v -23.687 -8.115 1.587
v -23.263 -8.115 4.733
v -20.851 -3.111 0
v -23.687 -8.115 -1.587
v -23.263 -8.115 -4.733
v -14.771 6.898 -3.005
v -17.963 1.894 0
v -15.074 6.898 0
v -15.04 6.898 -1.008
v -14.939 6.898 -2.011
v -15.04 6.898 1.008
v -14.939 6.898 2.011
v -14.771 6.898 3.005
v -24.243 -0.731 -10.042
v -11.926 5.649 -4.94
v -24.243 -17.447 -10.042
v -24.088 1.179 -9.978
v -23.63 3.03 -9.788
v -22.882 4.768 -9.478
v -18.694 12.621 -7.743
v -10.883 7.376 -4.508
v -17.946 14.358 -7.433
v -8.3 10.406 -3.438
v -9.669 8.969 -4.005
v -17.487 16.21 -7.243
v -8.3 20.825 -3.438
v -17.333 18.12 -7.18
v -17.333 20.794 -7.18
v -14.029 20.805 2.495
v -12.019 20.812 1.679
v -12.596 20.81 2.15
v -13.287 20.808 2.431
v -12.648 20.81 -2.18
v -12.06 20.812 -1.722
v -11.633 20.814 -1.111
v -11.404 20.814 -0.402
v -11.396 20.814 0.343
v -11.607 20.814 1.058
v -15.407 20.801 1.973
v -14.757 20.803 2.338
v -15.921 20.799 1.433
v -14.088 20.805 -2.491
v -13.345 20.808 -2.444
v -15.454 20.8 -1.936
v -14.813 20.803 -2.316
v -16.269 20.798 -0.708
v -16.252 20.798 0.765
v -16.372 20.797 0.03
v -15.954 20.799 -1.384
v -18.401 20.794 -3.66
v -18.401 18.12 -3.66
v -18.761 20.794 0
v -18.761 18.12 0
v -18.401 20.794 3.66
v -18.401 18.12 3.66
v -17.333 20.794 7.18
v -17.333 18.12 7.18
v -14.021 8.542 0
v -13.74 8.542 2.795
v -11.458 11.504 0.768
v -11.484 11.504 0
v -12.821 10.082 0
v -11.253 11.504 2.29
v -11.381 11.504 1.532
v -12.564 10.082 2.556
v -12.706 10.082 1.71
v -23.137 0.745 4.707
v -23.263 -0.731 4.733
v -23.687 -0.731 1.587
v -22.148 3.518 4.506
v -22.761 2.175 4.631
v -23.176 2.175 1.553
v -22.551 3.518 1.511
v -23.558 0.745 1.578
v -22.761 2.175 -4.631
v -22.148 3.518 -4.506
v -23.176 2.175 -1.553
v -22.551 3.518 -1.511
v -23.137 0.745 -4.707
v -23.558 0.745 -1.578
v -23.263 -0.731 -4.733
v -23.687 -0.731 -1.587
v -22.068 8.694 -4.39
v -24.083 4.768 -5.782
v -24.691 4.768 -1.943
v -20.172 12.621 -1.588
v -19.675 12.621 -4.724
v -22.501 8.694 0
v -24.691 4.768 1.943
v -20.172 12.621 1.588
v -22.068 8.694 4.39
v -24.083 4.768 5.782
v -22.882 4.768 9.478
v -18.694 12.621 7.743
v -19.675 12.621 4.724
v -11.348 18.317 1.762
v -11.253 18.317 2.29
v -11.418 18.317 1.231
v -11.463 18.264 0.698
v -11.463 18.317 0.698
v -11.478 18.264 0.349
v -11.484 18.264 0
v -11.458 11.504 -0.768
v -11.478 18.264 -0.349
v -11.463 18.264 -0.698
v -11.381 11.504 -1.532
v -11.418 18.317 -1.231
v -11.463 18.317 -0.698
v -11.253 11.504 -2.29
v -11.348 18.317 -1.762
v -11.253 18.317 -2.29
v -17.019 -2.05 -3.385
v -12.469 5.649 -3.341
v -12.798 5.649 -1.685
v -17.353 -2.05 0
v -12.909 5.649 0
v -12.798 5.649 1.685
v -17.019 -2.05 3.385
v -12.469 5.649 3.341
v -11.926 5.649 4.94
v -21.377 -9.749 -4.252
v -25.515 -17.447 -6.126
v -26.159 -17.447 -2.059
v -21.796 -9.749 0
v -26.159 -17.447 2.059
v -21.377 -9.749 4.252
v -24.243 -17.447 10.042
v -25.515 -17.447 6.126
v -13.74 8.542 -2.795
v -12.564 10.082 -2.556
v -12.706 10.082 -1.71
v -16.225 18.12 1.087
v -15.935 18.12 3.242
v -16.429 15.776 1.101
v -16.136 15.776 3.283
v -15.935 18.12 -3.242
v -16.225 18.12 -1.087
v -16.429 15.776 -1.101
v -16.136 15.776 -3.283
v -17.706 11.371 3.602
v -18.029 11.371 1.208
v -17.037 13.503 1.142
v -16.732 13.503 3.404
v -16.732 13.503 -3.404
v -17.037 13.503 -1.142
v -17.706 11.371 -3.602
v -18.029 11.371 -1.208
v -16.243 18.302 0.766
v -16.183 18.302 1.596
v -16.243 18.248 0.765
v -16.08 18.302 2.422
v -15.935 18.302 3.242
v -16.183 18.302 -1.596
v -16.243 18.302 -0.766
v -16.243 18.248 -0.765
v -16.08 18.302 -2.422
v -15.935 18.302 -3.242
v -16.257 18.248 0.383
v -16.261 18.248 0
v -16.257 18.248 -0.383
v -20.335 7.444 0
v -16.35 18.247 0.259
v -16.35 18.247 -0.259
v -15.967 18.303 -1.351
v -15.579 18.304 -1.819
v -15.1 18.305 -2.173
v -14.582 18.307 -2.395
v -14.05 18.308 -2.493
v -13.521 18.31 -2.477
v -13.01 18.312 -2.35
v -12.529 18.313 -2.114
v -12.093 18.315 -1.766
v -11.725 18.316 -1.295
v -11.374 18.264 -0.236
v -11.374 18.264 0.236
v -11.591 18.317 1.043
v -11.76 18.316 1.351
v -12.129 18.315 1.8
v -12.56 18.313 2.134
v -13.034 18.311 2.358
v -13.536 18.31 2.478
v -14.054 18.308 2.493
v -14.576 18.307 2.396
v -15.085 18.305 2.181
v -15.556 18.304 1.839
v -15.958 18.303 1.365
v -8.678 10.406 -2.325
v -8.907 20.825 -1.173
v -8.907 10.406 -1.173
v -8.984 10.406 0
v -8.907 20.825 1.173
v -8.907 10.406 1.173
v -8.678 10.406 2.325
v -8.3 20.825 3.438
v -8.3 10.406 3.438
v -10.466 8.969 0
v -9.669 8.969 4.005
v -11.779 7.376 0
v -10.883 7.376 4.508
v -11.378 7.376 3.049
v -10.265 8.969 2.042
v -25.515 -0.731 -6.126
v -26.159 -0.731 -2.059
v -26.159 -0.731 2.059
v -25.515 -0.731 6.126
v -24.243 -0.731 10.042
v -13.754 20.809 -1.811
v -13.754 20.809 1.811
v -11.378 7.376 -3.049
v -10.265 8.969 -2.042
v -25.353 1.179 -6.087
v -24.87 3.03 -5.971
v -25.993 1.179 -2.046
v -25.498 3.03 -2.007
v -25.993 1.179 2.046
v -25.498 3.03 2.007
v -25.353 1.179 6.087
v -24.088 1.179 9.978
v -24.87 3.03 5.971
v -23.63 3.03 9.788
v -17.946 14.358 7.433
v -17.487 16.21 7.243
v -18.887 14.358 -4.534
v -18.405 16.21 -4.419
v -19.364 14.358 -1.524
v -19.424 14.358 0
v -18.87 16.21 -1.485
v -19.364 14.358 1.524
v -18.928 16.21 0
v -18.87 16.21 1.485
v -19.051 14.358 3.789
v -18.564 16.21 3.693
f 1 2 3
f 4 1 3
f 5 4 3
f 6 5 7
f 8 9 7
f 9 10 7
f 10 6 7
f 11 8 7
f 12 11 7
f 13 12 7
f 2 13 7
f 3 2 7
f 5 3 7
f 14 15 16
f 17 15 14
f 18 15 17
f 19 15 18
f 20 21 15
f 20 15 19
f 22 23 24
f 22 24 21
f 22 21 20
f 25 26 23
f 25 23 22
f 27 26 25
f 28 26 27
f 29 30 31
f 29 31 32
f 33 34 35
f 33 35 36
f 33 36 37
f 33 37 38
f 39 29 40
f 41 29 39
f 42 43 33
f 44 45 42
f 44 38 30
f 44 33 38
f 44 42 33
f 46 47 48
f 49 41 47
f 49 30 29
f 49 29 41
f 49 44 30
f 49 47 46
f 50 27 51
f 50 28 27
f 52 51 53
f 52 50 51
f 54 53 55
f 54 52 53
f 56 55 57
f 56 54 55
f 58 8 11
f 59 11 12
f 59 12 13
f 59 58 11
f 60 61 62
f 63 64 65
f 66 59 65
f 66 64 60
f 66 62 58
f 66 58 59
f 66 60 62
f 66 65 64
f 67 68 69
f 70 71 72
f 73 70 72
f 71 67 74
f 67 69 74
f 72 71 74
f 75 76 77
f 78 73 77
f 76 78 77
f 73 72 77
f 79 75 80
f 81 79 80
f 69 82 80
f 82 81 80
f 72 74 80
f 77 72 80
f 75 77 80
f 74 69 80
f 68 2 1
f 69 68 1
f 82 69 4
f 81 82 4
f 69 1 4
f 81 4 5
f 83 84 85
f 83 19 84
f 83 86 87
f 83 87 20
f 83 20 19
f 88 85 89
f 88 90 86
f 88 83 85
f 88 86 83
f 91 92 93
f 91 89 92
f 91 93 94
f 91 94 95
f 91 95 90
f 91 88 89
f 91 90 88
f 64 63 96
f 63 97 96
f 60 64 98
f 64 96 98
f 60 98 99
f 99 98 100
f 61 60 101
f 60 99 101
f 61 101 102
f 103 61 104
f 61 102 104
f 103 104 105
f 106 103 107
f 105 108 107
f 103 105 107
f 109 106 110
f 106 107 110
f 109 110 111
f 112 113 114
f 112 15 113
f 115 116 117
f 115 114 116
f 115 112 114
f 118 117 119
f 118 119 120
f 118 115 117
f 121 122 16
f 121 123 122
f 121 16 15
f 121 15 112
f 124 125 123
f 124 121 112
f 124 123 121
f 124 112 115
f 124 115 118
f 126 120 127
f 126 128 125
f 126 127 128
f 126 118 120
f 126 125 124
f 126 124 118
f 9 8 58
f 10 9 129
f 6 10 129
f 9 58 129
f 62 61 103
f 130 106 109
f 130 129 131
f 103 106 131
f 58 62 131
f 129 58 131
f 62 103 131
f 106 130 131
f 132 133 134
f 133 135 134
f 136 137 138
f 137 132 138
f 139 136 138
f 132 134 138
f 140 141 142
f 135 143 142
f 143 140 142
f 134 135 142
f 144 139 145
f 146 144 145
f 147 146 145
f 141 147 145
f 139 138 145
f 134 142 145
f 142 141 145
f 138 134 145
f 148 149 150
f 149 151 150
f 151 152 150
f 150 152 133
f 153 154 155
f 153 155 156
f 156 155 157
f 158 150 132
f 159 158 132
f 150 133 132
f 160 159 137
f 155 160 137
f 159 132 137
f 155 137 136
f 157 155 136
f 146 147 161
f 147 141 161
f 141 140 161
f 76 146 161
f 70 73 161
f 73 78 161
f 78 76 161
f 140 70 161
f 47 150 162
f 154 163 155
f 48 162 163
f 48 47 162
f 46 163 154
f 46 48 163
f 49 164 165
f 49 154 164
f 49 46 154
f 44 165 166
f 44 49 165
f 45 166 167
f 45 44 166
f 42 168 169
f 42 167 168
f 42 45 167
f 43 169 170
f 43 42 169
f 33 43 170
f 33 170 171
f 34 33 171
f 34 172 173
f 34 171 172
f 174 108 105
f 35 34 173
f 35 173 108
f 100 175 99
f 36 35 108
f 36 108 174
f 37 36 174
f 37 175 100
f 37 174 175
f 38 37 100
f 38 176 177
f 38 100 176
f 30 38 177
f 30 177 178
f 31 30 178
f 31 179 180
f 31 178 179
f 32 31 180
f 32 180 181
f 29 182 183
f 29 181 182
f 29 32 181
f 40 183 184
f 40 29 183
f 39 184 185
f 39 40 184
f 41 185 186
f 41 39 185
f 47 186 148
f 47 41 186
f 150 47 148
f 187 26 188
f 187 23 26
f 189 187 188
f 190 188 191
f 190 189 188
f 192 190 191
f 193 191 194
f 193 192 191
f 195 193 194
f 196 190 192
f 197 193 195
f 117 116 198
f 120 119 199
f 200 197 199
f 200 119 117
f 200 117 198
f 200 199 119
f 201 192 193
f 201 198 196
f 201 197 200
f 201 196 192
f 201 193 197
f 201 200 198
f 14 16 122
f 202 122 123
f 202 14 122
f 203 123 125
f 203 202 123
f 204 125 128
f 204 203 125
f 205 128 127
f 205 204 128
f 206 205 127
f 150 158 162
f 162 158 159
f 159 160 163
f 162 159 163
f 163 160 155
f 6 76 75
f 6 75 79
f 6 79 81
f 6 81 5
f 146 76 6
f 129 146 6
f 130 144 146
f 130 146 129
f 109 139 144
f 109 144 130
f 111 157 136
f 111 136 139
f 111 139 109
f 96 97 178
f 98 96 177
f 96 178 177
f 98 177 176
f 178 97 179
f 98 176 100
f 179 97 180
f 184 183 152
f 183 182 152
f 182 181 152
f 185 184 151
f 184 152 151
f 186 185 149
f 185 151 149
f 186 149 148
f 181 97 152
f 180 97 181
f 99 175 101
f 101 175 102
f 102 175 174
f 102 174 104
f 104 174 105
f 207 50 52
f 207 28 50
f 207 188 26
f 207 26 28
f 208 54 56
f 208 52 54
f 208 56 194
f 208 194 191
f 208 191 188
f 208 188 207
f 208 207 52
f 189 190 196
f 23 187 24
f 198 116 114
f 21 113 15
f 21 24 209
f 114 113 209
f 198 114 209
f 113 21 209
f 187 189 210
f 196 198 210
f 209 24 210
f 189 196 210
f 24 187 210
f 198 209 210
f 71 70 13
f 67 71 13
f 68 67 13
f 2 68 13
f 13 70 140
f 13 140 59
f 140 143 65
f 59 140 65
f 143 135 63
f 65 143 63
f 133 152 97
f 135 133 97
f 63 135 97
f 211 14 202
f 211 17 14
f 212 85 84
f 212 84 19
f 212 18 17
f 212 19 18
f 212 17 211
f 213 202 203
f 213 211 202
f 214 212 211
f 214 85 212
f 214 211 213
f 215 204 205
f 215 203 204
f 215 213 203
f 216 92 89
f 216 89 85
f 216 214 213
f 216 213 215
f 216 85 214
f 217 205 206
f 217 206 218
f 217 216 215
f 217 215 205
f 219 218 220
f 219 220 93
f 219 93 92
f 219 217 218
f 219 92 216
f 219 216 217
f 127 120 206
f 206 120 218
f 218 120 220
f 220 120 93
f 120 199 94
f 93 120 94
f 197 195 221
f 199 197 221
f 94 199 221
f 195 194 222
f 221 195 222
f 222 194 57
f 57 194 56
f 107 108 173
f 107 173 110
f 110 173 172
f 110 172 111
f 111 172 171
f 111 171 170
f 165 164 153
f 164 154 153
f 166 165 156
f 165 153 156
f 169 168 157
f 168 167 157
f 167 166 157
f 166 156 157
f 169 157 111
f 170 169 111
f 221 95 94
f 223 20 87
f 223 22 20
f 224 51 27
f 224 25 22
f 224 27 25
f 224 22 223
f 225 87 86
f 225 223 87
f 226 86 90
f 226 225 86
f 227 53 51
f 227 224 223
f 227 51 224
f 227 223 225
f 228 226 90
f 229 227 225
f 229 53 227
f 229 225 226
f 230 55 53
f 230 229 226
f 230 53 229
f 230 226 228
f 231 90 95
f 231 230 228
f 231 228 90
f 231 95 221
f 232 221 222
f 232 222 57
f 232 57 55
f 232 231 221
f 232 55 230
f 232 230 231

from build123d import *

# Parameters (mm, degrees)
REVOLVE1_ANGLE     = 45
CUT_REVOLVE5_ANGLE = 23
SKETCH5_R          = 2.5
CUT_EXTRUDE1_DEPTH = 2.55


with BuildPart() as part:
    # Sketch1 → Revolve1 (revolve, symmetric)
    with BuildSketch(Plane.XY) as revolve1_sk:
        with BuildLine():
            Line((-26.239989701, -17.447458038), (-26.239989701, -0.731138339))
            ThreePointArc((-26.239989701, -0.731138339), (-25.865330741, 2.115285345), (-24.766875558, 4.767811185))
            Line((-24.766875558, 4.767811185), (-20.234178791, 12.620671907))
            ThreePointArc((-20.234178791, 12.620671907), (-19.135723608, 15.273197747), (-18.761064648, 18.119621431))
            Line((-18.761064648, 18.119621431), (-18.761064648, 20.793898522))
            Line((-18.761064648, 20.793898522), (-8.983798531, 20.825060578))
            Line((-8.983798531, 20.825060578), (-8.983798531, 10.405785055))
            ThreePointArc((-8.983798531, 10.405785055), (-11.144661105, 8.19078498), (-12.908903509, 5.648541651))
            Line((-12.908903509, 5.648541651), (-26.239989701, -17.447458038))
        make_face()
    revolve(axis=Axis((0, 0, 0), (0, -1, 0)), revolution_arc=REVOLVE1_ANGLE / 2)
    revolve(revolve1_sk.sketch, axis=Axis((0, 0, 0), (0, 1, 0)), revolution_arc=REVOLVE1_ANGLE / 2)

    # Sketch4 → Cut-Revolve5 (revolve, symmetric, cut)
    with BuildSketch(Plane.XY) as cut_revolve5_sk:
        with BuildLine():
            Line((-18.06897746, 11.370910651), (-22.601674227, 3.51804993))
            ThreePointArc((-22.601674227, 3.51804993), (-23.450480505, 1.468370871), (-23.739989701, -0.731138339))
            Line((-23.739989701, -0.731138339), (-23.739989701, -8.115272969))
            Line((-23.739989701, -8.115272969), (-15.07410484, 6.898302907))
            ThreePointArc((-15.07410484, 6.898302907), (-13.438873503, 9.325699255), (-11.483798531, 11.503752607))
            Line((-11.483798531, 11.503752607), (-11.483798531, 18.317079893))
            Line((-11.483798531, 18.317079893), (-16.261064648, 18.301853813))
            Line((-16.261064648, 18.301853813), (-16.261064648, 18.119621431))
            ThreePointArc((-16.261064648, 18.119621431), (-16.720873371, 14.626283274), (-18.06897746, 11.370910651))
        make_face()
    revolve(axis=Axis((0, 0, 0), (0, -1, 0)), revolution_arc=CUT_REVOLVE5_ANGLE / 2, mode=Mode.SUBTRACT)
    revolve(cut_revolve5_sk.sketch, axis=Axis((0, 0, 0), (0, 1, 0)), revolution_arc=CUT_REVOLVE5_ANGLE / 2, mode=Mode.SUBTRACT)

    # Sketch5 → Cut-Extrude1 (cut)
    with BuildSketch(Plane(origin=(-0.071940118, 20.85344552, 0), x_dir=(-0.9999940495093123, -0.003449774770501149, 0), z_dir=(0.003449774770501149, -0.9999940495093123, 0))):
        with Locations(Location((13.8, 0, 0), (0, 0, 342.175900363))):
            Circle(SKETCH5_R)
    extrude(amount=CUT_EXTRUDE1_DEPTH, mode=Mode.SUBTRACT)


solid = part.part
